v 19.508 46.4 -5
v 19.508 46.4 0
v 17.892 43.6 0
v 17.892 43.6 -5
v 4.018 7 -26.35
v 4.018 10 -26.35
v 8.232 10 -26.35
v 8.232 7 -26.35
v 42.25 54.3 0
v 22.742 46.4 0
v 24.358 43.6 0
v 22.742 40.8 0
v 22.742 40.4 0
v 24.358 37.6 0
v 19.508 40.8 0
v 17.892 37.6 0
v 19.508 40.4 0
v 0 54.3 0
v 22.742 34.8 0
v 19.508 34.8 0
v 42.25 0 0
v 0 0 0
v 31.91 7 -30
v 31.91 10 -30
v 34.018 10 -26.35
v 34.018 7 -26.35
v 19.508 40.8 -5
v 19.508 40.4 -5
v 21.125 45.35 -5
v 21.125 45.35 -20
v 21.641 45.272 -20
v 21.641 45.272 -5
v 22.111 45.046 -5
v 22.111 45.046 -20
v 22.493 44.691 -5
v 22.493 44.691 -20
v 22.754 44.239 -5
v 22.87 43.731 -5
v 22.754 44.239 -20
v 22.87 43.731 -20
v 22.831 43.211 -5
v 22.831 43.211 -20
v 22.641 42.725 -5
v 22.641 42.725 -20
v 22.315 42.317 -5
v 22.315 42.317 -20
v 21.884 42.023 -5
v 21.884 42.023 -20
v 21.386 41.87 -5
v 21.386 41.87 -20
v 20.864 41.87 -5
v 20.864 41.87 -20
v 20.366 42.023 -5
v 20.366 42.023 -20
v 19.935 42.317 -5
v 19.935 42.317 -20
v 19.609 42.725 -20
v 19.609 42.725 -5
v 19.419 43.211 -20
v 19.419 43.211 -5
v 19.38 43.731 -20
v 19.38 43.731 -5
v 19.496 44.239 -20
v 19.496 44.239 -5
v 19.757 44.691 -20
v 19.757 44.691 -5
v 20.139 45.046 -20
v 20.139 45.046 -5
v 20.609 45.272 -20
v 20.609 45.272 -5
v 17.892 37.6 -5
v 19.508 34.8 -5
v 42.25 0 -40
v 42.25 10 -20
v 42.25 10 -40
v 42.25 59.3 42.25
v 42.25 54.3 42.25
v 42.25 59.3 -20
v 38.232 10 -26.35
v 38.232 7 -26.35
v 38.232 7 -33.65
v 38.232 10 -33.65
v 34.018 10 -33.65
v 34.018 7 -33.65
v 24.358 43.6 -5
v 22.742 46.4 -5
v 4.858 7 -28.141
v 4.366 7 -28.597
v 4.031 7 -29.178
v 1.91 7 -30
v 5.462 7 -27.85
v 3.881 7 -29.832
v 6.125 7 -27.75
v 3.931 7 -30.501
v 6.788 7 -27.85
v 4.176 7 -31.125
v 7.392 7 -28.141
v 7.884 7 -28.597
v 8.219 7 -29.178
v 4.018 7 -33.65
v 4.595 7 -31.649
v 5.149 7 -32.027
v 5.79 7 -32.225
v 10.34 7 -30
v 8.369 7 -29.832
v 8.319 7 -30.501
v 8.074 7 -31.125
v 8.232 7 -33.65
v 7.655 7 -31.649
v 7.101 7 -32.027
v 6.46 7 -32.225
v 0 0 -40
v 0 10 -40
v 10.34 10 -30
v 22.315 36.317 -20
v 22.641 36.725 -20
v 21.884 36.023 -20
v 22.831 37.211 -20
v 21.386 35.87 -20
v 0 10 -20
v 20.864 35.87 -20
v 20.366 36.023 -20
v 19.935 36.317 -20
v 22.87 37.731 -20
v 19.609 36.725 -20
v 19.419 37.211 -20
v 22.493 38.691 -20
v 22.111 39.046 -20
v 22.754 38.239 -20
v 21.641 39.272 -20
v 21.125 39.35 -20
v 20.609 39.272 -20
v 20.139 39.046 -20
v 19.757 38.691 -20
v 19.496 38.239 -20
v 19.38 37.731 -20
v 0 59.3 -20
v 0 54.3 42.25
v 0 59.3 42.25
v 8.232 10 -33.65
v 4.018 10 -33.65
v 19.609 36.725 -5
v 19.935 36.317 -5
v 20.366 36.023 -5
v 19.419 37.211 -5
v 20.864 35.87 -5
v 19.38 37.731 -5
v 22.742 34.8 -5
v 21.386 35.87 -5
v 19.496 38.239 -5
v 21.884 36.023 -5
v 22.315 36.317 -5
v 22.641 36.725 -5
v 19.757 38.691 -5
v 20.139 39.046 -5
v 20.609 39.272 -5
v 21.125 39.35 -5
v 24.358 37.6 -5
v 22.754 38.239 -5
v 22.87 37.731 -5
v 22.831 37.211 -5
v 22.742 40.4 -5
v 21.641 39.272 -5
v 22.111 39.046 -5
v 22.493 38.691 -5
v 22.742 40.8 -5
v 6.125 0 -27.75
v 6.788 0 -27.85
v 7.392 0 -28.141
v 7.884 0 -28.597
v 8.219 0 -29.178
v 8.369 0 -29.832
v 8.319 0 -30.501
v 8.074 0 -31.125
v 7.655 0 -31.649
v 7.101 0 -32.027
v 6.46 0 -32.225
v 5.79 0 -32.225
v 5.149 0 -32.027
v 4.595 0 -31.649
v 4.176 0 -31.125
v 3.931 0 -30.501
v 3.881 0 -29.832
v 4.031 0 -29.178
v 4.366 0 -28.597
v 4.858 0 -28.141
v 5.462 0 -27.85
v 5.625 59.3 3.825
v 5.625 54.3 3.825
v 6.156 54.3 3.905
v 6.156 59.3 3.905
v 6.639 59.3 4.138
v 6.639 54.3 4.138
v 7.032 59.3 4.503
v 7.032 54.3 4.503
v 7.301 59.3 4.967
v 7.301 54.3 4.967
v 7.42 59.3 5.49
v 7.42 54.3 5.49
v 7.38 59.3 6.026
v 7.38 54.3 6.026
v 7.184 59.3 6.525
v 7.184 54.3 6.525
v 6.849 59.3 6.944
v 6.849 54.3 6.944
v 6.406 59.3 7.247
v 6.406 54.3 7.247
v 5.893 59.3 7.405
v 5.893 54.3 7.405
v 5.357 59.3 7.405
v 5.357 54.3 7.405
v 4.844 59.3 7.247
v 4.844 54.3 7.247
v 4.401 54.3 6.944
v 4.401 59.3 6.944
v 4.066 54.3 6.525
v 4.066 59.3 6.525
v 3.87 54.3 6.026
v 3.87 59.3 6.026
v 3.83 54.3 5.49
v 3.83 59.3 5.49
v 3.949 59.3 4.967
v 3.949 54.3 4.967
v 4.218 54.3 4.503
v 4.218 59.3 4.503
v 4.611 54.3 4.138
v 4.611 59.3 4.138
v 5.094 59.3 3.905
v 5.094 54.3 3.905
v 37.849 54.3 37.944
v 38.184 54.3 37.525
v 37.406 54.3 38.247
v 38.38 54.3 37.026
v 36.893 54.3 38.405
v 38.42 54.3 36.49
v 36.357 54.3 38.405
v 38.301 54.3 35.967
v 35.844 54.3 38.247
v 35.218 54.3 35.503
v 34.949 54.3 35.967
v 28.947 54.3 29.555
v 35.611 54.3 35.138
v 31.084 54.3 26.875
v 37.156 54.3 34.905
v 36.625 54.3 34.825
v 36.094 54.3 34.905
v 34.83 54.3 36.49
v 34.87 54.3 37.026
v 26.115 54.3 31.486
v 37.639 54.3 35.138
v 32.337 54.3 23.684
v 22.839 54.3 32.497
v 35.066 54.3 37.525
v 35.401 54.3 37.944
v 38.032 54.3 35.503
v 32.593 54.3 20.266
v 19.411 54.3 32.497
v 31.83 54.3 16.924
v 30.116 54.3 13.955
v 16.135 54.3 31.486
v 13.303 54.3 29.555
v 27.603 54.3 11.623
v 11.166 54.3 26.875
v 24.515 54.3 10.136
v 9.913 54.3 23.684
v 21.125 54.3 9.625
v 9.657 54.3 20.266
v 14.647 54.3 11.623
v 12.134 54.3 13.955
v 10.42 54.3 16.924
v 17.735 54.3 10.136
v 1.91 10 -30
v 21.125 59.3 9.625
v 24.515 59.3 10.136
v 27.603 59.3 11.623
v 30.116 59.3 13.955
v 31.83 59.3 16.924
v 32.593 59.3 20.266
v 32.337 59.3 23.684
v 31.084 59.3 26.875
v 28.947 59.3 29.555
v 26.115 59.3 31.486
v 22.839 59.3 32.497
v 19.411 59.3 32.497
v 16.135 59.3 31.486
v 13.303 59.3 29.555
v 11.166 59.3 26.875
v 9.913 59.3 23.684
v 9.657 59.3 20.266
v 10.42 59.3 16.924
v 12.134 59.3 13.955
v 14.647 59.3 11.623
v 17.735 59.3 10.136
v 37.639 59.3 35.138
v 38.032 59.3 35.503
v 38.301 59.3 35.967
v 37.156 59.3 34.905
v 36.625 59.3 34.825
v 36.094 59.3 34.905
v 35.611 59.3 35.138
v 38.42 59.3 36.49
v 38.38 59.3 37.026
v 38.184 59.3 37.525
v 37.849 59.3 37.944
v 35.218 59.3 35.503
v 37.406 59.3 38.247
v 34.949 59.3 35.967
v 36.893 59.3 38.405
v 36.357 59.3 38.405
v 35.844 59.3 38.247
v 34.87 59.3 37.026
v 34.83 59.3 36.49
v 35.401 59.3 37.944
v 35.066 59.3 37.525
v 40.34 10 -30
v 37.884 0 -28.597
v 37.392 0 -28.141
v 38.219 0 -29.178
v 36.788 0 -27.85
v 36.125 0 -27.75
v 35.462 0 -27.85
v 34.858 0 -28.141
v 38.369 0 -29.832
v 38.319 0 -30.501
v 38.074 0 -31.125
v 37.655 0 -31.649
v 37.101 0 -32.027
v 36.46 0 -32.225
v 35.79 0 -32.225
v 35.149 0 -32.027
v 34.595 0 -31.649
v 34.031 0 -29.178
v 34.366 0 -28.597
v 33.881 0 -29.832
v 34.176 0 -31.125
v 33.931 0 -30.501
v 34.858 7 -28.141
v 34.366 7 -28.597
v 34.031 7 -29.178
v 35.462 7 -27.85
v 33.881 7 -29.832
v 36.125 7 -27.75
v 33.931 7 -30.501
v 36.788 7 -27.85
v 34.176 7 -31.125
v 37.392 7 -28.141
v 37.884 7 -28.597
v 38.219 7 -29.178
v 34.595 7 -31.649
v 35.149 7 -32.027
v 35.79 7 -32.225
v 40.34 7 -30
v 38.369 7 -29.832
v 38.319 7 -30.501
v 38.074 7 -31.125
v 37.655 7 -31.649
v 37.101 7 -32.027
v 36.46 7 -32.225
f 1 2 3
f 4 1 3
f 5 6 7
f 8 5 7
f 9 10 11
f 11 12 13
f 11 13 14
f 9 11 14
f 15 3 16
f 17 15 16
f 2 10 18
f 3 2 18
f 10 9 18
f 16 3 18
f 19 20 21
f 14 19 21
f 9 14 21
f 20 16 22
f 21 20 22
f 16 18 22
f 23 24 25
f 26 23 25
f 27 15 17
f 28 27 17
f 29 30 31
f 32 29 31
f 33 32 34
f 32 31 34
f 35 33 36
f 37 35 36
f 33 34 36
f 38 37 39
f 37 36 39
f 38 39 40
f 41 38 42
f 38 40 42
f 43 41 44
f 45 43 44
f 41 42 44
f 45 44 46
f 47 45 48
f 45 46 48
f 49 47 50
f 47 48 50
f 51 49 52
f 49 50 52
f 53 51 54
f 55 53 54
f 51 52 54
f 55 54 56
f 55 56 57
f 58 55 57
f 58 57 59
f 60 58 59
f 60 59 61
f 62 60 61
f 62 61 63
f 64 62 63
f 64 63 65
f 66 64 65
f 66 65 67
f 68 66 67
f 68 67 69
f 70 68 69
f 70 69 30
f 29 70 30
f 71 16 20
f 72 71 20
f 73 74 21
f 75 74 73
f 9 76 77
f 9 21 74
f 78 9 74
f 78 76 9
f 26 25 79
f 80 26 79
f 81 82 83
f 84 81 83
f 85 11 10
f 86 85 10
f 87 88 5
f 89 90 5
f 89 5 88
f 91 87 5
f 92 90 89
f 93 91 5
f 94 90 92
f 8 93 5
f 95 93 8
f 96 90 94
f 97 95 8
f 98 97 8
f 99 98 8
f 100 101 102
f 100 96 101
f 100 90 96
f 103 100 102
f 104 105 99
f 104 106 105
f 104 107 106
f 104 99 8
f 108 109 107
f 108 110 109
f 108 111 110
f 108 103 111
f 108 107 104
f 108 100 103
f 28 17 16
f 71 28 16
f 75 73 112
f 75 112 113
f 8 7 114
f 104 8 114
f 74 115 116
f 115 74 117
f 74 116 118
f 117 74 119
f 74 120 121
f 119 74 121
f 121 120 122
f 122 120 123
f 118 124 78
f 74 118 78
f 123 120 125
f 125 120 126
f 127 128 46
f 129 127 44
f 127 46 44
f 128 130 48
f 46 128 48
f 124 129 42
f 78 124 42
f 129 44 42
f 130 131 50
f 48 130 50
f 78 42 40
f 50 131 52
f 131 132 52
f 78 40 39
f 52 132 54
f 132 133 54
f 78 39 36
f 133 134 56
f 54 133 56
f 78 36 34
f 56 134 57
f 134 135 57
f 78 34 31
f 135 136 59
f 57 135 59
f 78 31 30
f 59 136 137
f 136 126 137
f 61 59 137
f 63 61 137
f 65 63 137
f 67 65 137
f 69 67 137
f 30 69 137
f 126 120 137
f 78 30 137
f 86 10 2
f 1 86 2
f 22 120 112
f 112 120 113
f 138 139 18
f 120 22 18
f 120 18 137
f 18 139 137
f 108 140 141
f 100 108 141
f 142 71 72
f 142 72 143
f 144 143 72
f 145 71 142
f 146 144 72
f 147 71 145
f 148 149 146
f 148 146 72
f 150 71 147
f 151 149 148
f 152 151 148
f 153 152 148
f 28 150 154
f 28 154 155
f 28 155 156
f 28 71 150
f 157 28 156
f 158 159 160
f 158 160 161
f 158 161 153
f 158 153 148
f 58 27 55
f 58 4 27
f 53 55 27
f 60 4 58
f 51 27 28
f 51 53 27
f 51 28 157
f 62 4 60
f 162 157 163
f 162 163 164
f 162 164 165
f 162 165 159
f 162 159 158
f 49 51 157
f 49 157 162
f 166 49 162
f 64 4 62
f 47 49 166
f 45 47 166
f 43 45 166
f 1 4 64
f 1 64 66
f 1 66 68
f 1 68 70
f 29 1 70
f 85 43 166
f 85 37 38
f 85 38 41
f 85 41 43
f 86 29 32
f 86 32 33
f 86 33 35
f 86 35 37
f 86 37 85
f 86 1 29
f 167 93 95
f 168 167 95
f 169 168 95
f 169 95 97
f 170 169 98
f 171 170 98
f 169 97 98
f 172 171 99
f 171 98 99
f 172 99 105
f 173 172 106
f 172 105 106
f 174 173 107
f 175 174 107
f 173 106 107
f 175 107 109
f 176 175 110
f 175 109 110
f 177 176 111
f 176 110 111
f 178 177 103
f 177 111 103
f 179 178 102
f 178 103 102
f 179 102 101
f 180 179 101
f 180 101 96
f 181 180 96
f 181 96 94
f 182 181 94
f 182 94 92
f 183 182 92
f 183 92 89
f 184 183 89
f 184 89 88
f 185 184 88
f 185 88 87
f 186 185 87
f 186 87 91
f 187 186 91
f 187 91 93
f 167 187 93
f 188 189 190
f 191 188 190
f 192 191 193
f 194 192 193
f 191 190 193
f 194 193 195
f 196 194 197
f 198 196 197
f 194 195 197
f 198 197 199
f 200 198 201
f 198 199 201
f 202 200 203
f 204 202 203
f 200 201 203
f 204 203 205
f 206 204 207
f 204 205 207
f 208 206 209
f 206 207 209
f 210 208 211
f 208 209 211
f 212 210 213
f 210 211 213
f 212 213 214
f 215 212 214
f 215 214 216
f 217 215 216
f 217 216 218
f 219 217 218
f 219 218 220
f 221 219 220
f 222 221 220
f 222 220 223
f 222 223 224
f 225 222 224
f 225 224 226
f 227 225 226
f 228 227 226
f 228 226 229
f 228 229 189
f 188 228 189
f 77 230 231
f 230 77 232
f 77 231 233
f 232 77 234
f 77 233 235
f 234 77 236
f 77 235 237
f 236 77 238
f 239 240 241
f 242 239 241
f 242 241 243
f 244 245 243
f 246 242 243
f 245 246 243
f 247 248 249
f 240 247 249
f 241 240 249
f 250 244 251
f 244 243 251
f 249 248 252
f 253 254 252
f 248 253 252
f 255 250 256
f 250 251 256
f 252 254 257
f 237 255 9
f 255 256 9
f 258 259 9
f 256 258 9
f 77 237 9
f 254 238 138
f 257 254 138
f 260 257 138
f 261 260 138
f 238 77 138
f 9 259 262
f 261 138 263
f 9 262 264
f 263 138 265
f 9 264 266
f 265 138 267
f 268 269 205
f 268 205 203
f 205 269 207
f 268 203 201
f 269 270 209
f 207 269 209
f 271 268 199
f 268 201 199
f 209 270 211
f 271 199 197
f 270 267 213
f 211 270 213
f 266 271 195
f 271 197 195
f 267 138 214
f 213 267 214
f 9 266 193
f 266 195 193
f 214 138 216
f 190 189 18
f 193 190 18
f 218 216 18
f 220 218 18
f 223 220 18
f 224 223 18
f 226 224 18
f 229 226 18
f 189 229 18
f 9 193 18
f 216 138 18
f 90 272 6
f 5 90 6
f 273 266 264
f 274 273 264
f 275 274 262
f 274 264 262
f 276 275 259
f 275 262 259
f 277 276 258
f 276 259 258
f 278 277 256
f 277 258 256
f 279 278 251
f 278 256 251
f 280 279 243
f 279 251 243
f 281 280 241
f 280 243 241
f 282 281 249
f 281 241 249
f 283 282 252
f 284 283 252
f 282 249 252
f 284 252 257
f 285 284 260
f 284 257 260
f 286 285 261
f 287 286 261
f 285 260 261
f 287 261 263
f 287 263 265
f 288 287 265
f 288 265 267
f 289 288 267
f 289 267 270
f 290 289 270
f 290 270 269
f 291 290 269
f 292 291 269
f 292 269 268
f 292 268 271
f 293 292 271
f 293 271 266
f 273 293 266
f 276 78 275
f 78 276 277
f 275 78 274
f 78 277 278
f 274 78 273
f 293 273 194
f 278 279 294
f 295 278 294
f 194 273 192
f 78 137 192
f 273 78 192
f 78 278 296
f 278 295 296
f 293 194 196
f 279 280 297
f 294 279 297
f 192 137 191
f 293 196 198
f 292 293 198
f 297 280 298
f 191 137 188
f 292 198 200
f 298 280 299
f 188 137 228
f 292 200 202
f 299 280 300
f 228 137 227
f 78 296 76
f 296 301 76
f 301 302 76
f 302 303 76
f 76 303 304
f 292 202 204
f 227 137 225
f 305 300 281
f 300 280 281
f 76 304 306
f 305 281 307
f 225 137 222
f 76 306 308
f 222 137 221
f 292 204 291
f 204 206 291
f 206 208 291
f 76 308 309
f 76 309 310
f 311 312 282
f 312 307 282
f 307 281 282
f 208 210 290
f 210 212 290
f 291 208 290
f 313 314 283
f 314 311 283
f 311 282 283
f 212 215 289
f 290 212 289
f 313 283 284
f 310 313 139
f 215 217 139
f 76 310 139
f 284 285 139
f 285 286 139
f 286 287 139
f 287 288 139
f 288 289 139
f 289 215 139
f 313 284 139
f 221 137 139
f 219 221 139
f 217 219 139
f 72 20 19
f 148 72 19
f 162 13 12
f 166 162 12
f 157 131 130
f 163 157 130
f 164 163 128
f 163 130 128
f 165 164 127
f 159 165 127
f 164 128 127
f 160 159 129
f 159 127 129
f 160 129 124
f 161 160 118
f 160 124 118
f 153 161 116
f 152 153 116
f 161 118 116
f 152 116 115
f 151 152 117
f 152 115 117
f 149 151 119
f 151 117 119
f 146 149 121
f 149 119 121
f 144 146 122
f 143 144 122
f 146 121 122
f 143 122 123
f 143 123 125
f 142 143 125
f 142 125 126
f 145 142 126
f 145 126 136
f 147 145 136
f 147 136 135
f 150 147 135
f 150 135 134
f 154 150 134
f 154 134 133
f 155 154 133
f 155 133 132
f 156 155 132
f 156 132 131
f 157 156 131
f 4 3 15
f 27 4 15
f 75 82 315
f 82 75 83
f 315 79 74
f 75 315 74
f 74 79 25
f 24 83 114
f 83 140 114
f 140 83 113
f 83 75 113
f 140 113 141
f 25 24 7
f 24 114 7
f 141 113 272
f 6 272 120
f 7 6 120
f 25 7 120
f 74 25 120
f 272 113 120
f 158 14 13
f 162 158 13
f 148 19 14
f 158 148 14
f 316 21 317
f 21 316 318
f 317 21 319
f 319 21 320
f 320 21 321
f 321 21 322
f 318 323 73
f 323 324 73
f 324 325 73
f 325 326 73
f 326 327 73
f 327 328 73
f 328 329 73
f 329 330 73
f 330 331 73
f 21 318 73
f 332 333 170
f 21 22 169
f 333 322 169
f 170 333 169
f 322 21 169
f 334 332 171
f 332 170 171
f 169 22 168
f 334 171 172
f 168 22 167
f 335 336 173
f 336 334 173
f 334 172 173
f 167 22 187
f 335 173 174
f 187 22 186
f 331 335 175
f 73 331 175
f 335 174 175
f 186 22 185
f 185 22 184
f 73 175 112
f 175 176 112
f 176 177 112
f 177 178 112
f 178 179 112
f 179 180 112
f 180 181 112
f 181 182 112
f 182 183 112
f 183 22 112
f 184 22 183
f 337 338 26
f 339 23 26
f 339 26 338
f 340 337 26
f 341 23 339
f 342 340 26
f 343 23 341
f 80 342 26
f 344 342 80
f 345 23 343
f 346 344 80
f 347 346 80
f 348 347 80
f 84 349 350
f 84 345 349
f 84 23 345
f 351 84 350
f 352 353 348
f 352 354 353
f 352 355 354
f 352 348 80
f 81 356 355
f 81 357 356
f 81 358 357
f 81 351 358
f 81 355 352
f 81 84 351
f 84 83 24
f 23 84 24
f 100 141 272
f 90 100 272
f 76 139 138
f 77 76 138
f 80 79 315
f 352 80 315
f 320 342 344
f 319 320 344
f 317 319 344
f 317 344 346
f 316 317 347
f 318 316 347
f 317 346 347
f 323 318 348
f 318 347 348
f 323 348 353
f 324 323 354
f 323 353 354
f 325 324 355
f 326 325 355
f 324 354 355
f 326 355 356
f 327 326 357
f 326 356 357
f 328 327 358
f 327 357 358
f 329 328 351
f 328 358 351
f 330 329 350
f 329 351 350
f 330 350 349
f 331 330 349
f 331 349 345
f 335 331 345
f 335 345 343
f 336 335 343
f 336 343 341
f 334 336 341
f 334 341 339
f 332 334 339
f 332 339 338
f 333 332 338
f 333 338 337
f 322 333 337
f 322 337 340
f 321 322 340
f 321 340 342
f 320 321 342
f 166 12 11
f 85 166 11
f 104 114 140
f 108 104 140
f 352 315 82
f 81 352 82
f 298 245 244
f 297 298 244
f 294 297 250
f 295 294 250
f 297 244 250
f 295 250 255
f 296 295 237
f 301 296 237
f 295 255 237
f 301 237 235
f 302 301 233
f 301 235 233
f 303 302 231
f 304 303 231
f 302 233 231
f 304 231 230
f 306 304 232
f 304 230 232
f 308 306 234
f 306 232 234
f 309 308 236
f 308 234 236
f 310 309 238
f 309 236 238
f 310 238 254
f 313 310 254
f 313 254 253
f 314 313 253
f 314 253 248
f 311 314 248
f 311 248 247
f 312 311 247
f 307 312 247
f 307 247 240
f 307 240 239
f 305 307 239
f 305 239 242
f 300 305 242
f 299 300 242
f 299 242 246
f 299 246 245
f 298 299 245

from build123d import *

# Parameters (mm, degrees)
BOSS_EXTRUDE1_DEPTH = 42.25
SKETCH3_R           = 2.25
CUT_EXTRUDE1_DEPTH  = 78.46363663
SKETCH4_R           = 11.5
SKETCH4_R_2         = 1.8
CUT_EXTRUDE2_DEPTH  = 81.737940276
SKETCH5_R           = 1.75
CUT_EXTRUDE3_DEPTH  = 96.794650164
CUT_EXTRUDE4_DEPTH  = 5
CUT_EXTRUDE5_DEPTH  = 3


with BuildPart() as part:
    # Sketch1 → Boss-Extrude1 (new body)
    with BuildSketch(Plane(origin=(0, 0, 0), x_dir=(0, 0, -1), z_dir=(1, 0, 0))):
        Polygon((0, 0), (40, 0), (40, 10), (20, 10), (20, 59.3), (-42.25, 59.3), (-42.25, 54.3), (0, 54.3), align=None)
    extrude(amount=BOSS_EXTRUDE1_DEPTH)

    # Sketch3 → Cut-Extrude1 (cut, through all)
    with BuildSketch(Plane(origin=(0, 10, 0), x_dir=(1, 0, 0), z_dir=(0, 1, 0))):
        with Locations(Location((6.125, 30, 0), (0, 0, 270))):
            Circle(SKETCH3_R)
        with Locations(Location((36.125, 30, 0), (0, 0, 270))):
            Circle(SKETCH3_R)
    extrude(amount=-CUT_EXTRUDE1_DEPTH, mode=Mode.SUBTRACT)

    # Sketch4 → Cut-Extrude2 (cut, through all)
    with BuildSketch(Plane.XZ.offset(-54.3)):
        with Locations(Location((21.125, 21.125, 0), (0, 0, 270))):
            Circle(SKETCH4_R)
        with Locations(Location((5.625, 5.625, 0), (0, 0, 270))):
            Circle(SKETCH4_R_2)
        with Locations(Location((36.625, 36.625, 0), (0, 0, 270))):
            Circle(SKETCH4_R_2)
    extrude(amount=-CUT_EXTRUDE2_DEPTH, mode=Mode.SUBTRACT)

    # Sketch5 → Cut-Extrude3 (cut, through all)
    with BuildSketch(Plane(origin=(0, 0, -20), x_dir=(-1, 0, 0), z_dir=(0, 0, -1))):
        with Locations(Location((-21.125, 43.6, 0), (0, 0, 90))):
            Circle(SKETCH5_R)
        with Locations(Location((-21.125, 37.6, 0), (0, 0, 90))):
            Circle(SKETCH5_R)
    extrude(amount=-CUT_EXTRUDE3_DEPTH, mode=Mode.SUBTRACT)

    # Sketch6 → Cut-Extrude4 (cut)
    with BuildSketch(Plane.XY):
        Polygon((19.508419246, 40.8), (19.508419246, 40.4), (17.891838493, 37.6), (19.508419246, 34.8), (22.741580754, 34.8), (24.358161507, 37.6), (22.741580754, 40.4), (22.741580754, 40.8), (24.358161507, 43.6), (22.741580754, 46.4), (19.508419246, 46.4), (17.891838493, 43.6), align=None)
    extrude(amount=-CUT_EXTRUDE4_DEPTH, mode=Mode.SUBTRACT)

    # Sketch7 → Cut-Extrude5 (cut)
    with BuildSketch(Plane(origin=(0, 10, 0), x_dir=(1, 0, 0), z_dir=(0, 1, 0))):
        Polygon((10.339656965, 30), (8.232328483, 33.65), (4.017671517, 33.65), (1.910343035, 30), (4.017671517, 26.35), (8.232328483, 26.35), align=None)
        Polygon((40.339656965, 30), (38.232328483, 33.65), (34.017671517, 33.65), (31.910343035, 30), (34.017671517, 26.35), (38.232328483, 26.35), align=None)
    extrude(amount=-CUT_EXTRUDE5_DEPTH, mode=Mode.SUBTRACT)


solid = part.part
